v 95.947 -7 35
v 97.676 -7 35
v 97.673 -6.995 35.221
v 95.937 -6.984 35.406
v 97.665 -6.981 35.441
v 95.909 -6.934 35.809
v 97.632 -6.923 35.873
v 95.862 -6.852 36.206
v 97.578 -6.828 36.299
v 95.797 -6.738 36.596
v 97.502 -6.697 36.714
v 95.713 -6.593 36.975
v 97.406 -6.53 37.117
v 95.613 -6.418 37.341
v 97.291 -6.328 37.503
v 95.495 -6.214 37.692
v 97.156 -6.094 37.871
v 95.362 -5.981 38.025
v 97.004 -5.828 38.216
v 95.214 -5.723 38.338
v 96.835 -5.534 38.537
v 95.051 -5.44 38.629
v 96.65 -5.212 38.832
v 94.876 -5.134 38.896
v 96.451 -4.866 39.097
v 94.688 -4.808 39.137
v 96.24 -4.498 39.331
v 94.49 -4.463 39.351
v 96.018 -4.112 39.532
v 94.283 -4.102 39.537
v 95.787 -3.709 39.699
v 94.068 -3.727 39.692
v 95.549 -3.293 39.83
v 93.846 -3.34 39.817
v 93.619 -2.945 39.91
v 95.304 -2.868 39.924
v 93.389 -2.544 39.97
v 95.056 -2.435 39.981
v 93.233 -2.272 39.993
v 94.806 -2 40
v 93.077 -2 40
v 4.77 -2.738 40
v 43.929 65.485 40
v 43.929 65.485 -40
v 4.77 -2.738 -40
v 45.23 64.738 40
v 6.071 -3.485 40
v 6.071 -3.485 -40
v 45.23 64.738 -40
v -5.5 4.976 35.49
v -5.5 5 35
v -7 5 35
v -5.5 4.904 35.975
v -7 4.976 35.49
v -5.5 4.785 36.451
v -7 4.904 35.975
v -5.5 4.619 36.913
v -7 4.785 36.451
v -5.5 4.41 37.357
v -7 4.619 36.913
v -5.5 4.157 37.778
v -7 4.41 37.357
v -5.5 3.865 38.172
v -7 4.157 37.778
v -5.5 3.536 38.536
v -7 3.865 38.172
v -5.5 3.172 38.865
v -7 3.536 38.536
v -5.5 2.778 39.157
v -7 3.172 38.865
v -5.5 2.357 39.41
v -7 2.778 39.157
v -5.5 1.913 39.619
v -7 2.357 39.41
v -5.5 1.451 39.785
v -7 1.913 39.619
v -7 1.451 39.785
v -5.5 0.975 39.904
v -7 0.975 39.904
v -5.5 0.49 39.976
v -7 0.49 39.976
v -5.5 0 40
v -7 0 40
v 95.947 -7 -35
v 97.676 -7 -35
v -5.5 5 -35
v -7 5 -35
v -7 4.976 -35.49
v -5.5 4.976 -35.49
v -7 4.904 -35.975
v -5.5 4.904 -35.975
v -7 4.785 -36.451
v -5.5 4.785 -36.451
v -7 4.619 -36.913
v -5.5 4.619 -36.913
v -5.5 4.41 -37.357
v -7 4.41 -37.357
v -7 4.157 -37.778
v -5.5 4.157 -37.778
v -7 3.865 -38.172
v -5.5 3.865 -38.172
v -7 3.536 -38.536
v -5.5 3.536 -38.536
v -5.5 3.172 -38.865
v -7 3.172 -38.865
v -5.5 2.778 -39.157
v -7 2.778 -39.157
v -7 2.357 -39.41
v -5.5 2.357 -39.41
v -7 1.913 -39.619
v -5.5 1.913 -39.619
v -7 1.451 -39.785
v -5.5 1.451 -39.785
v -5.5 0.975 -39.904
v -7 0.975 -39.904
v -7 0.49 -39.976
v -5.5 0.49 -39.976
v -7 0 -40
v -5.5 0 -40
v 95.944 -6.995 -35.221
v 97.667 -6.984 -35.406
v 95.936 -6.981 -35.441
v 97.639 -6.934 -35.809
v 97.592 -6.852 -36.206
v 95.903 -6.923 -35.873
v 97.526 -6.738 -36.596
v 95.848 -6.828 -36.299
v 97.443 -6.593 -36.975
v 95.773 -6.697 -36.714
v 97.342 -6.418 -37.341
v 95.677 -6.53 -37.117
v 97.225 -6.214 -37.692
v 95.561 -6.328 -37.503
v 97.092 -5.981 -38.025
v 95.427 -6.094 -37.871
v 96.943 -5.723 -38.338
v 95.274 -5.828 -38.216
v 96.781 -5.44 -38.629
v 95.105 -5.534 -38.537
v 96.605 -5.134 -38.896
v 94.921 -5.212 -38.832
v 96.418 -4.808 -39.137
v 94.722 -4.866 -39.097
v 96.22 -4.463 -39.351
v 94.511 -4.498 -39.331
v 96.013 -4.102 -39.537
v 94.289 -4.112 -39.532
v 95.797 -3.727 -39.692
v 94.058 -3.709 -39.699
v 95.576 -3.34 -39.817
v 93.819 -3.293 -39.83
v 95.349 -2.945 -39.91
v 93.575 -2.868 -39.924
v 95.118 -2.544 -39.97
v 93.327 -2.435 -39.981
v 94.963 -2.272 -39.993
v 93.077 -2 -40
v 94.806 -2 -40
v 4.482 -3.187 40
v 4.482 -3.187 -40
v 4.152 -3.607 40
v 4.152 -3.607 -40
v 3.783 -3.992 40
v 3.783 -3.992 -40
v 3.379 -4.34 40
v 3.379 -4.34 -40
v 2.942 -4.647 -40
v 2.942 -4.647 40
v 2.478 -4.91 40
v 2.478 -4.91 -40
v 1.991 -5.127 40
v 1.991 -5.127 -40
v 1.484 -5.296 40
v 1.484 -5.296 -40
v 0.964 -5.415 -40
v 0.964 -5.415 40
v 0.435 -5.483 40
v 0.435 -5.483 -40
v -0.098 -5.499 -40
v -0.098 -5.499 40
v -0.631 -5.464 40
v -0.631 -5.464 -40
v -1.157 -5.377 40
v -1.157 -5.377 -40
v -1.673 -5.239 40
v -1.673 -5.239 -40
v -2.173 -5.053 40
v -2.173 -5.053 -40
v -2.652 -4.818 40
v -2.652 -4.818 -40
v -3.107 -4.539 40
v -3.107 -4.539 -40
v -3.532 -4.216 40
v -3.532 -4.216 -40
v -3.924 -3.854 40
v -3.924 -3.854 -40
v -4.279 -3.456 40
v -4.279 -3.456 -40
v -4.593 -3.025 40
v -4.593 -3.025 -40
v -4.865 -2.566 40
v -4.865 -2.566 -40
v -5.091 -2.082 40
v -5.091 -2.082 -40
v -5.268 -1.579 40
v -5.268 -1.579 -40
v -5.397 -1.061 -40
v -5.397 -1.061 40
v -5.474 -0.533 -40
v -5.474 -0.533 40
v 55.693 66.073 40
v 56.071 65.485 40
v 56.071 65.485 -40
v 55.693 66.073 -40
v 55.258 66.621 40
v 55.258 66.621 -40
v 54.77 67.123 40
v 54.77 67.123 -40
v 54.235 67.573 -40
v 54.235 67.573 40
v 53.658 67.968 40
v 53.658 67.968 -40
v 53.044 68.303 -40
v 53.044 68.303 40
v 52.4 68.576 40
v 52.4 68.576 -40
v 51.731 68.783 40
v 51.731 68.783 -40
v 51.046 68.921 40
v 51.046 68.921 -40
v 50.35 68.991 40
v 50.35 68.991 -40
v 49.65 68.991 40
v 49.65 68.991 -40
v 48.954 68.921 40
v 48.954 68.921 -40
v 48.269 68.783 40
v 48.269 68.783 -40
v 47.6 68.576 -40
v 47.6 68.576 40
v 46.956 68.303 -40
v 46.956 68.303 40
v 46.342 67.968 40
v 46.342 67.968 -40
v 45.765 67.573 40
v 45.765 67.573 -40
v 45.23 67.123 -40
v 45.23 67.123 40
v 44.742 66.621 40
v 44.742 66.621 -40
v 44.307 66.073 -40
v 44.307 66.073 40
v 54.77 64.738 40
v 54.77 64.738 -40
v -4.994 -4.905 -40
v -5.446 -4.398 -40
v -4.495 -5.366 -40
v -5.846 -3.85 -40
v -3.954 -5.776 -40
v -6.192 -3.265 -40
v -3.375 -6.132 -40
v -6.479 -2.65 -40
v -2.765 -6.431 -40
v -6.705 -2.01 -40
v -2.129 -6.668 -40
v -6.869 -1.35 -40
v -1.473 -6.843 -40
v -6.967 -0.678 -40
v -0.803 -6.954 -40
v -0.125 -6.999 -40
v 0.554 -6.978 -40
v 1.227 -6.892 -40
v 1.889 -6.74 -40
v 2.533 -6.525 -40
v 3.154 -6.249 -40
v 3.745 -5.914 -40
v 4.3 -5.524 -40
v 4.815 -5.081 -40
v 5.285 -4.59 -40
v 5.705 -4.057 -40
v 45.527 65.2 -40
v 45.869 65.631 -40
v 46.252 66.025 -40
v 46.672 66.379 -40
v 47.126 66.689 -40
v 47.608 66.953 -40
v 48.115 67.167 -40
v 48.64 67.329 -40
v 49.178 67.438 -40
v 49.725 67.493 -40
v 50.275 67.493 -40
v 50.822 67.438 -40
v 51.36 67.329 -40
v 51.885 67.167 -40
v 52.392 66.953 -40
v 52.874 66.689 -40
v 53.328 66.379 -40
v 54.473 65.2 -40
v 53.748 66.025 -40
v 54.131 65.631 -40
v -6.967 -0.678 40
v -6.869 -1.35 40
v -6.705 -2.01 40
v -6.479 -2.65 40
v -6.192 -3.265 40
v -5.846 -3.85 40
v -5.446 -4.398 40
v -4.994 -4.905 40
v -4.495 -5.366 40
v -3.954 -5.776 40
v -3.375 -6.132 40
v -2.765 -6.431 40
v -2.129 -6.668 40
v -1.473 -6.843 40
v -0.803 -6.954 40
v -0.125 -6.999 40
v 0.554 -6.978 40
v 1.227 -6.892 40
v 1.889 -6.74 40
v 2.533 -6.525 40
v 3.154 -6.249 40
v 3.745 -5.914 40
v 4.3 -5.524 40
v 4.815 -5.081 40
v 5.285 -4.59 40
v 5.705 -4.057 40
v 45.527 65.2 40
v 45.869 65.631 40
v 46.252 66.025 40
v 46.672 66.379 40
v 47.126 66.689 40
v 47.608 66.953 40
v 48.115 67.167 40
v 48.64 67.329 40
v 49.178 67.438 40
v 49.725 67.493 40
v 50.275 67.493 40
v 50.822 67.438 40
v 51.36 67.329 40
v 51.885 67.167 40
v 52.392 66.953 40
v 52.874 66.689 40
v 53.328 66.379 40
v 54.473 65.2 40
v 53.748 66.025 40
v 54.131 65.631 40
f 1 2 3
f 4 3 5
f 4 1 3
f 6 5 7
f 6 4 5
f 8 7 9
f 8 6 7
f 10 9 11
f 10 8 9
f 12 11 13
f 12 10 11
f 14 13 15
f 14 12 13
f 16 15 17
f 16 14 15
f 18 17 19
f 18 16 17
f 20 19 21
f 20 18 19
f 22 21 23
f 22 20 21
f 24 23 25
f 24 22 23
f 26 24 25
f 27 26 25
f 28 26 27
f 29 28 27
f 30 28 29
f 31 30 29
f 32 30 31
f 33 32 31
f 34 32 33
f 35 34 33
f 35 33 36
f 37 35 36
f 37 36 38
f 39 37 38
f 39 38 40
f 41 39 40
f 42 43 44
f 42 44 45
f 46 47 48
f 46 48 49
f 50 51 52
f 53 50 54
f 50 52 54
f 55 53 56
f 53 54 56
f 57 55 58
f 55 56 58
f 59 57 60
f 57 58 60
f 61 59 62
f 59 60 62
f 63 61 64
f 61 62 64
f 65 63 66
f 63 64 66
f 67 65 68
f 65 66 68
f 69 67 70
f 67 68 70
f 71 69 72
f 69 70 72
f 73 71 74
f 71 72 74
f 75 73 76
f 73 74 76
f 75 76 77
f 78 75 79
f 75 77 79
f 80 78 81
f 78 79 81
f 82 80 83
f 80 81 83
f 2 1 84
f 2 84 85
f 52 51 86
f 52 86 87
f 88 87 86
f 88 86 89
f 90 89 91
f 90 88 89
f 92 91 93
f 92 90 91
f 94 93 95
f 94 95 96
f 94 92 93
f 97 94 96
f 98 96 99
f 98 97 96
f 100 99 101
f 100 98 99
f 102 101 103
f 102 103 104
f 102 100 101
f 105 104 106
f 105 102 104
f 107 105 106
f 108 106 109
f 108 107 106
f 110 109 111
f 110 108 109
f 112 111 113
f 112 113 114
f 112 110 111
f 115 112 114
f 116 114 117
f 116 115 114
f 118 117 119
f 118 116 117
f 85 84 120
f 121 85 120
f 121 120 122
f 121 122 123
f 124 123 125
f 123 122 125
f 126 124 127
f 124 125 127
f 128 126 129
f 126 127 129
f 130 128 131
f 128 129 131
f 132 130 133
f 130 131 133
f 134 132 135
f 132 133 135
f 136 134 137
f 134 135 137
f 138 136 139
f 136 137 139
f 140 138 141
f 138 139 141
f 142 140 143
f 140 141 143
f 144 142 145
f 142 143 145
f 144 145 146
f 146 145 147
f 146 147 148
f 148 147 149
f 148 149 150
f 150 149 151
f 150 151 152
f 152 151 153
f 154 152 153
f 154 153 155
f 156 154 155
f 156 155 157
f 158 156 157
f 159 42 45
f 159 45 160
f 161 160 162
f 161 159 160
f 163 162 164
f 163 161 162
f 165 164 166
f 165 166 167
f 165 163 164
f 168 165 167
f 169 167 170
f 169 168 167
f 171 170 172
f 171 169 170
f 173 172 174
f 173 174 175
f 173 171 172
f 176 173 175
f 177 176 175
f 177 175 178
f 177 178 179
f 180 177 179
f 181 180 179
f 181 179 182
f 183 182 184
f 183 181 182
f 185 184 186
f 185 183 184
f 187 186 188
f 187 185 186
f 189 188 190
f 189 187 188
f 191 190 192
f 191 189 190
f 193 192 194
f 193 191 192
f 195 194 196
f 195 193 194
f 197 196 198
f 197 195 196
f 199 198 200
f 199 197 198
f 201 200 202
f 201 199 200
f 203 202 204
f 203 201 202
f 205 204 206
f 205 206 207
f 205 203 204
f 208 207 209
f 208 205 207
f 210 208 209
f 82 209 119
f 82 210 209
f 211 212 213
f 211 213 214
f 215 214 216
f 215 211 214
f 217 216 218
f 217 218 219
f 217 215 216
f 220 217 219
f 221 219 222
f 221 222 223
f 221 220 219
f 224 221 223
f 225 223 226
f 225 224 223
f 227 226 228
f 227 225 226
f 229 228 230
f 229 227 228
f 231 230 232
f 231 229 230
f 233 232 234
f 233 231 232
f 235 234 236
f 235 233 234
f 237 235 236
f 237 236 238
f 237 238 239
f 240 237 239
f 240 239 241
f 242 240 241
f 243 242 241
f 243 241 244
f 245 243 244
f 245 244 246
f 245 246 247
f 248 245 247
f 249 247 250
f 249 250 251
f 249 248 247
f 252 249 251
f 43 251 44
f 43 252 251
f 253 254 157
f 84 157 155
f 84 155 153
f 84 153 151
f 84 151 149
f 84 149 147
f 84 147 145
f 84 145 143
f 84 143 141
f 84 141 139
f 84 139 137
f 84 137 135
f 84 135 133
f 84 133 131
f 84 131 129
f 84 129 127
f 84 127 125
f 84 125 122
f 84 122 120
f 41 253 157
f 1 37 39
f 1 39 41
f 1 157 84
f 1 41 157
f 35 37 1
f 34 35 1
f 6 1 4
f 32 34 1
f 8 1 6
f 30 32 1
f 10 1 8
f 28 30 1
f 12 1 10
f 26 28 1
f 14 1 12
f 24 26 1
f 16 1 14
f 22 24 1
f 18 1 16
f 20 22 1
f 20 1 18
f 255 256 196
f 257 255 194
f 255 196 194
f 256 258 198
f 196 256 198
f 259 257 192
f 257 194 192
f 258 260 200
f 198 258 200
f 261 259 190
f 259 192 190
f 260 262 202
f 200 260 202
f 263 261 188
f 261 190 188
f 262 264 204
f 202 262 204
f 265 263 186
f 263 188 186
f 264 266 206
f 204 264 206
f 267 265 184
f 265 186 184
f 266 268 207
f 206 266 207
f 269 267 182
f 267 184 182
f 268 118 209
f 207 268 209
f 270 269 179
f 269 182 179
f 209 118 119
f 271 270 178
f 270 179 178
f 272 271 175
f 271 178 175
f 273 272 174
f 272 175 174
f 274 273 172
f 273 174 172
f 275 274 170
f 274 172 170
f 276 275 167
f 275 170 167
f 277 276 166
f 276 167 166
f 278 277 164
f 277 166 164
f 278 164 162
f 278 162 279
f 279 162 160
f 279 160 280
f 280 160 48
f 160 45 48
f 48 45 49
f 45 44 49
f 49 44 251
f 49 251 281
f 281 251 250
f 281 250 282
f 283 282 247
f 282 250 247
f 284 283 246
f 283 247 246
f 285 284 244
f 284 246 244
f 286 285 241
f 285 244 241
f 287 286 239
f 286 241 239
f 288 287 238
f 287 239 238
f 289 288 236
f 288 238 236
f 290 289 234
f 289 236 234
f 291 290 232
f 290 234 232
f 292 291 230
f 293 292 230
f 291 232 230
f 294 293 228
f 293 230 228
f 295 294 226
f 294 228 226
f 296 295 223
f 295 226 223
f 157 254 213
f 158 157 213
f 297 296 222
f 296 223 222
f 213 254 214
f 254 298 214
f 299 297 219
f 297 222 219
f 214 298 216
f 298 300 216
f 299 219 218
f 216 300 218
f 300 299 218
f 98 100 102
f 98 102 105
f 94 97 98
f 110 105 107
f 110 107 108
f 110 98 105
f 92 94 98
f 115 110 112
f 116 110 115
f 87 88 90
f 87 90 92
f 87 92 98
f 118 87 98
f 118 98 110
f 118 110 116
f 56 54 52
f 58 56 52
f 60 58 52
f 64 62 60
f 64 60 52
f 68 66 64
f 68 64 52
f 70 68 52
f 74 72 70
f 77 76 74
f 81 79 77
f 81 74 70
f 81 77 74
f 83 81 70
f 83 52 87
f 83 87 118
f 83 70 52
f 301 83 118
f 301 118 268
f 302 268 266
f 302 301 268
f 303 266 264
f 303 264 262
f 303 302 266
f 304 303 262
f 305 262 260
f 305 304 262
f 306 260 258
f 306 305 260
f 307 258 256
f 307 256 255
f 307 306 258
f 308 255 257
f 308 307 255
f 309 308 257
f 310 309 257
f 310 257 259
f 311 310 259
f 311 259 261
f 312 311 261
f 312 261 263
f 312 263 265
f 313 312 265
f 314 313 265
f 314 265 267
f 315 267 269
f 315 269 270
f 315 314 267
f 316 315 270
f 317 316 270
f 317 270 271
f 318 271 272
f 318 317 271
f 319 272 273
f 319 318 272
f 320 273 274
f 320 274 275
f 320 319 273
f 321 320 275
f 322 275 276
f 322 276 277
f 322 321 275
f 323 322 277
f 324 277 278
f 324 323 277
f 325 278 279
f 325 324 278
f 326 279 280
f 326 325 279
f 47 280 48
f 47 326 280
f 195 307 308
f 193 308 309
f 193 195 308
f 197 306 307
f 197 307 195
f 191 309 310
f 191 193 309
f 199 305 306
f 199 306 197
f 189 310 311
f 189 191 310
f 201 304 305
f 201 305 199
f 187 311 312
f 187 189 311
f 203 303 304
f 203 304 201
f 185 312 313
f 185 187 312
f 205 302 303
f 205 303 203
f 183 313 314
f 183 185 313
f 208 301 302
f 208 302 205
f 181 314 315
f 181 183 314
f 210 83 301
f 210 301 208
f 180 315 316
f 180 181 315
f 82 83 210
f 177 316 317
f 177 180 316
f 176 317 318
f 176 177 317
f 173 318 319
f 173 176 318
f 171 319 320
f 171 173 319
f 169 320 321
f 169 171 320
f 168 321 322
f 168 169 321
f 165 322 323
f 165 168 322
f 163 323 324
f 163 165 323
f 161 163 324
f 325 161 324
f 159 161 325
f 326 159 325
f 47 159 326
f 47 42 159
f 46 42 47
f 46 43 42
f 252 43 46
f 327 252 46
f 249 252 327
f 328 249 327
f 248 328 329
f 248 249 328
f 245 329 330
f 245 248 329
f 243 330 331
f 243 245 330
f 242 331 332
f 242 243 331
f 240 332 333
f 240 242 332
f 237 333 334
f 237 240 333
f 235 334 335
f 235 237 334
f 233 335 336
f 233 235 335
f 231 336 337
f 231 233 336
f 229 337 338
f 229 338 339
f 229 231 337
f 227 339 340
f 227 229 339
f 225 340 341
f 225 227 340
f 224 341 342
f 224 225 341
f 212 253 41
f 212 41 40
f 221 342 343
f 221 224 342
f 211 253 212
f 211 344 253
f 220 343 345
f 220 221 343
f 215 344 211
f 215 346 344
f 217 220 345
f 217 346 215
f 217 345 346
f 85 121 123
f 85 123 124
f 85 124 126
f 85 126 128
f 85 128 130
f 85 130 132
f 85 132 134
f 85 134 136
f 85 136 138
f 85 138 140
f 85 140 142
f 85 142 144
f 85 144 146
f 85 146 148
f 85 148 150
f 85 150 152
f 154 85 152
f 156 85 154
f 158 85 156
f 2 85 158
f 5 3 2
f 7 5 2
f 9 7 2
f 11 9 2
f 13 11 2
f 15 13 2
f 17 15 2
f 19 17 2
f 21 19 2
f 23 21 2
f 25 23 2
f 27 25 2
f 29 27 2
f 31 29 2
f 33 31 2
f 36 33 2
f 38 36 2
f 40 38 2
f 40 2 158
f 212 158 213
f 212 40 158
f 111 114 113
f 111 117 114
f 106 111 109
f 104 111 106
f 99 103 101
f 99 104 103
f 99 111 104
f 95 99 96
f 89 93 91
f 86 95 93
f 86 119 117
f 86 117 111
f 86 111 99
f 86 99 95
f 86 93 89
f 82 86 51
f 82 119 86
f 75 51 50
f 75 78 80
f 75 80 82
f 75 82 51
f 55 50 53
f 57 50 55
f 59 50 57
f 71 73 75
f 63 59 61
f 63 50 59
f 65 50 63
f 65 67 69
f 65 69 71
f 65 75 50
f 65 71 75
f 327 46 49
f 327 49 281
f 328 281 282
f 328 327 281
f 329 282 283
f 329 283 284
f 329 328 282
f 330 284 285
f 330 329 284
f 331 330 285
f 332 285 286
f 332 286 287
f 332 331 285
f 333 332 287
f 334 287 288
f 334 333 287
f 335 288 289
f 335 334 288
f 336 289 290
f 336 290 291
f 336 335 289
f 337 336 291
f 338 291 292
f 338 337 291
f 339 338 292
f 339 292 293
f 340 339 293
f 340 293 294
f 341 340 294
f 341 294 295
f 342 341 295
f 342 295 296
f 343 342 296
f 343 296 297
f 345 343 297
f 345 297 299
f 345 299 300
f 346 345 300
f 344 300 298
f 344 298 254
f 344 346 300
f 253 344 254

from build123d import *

# Parameters (mm, degrees)
F1_DEPTH    = 40
F2_T1_DEPTH = 14
F2_T3_DEPTH = 26.7295341336


# Not quite as in the source:
# - a fillet or chamfer that OpenCascade refuses, or shapes differently, is made with other operations: its cross-section is extruded or revolved along the edge and cut away or added


with BuildPart() as f1:
    # F0 (on Top) → F1 (new body, symmetric)
    with BuildSketch(Plane.XY):
        with BuildLine():
            Line((-7, 5), (-7, 0))
            ThreePointArc((-7, 0), (-1.8031925829, -6.7637634871), (6.0709990026, -3.484676615))
            Line((6.0709990026, -3.484676615), (45.2299293551, 64.7379601975))
            ThreePointArc((45.2299293551, 64.7379601975), (50, 67.5), (54.7700706449, 64.7379601975))
            Line((54.7700706449, 64.7379601975), (95.9467521433, -7))
            Line((95.9467521433, -7), (97.6762862769, -7))
            Line((97.6762862769, -7), (56.0709990026, 65.484676615))
            ThreePointArc((56.0709990026, 65.484676615), (50, 69), (43.9290009974, 65.484676615))
            Line((43.9290009974, 65.484676615), (4.7700706449, -2.7379601975))
            ThreePointArc((4.7700706449, -2.7379601975), (-1.4167941723, -5.314385597), (-5.5, 0))
            Line((-5.5, 0), (-5.5, 5))
            Line((-5.5, 5), (-7, 5))
        make_face()
    extrude(amount=F1_DEPTH, both=True)

    # F2: fillet of radius 5 on 4 edges, made by hand

    # F2_s2 → F2_t1 (cut)
    with BuildSketch(Plane.YZ.offset(-19.5)):
        with BuildLine():
            ThreePointArc((5, 35), (3.5355339059, 38.5355339059), (0, 40))
            Line((0, 40), (5, 40))
            Line((5, 40), (5, 35))
        make_face()
        with BuildLine():
            ThreePointArc((5, -35), (3.5355339059, -38.5355339059), (0, -40))
            Line((0, -40), (5, -40))
            Line((5, -40), (5, -35))
        make_face()
    extrude(amount=F2_T1_DEPTH, mode=Mode.SUBTRACT)

    # F2_s4 → F2_t3 (cut)
    with BuildSketch(Plane.YZ.offset(83.4467521433)):
        with BuildLine():
            ThreePointArc((-7, 35), (-5.5355339059, 38.5355339059), (-2, 40))
            Line((-2, 40), (-7, 40))
            Line((-7, 40), (-7, 35))
        make_face()
        with BuildLine():
            ThreePointArc((-7, -35), (-5.5355339059, -38.5355339059), (-2, -40))
            Line((-2, -40), (-7, -40))
            Line((-7, -40), (-7, -35))
        make_face()
    extrude(amount=F2_T3_DEPTH, mode=Mode.SUBTRACT)


solid = f1.part
